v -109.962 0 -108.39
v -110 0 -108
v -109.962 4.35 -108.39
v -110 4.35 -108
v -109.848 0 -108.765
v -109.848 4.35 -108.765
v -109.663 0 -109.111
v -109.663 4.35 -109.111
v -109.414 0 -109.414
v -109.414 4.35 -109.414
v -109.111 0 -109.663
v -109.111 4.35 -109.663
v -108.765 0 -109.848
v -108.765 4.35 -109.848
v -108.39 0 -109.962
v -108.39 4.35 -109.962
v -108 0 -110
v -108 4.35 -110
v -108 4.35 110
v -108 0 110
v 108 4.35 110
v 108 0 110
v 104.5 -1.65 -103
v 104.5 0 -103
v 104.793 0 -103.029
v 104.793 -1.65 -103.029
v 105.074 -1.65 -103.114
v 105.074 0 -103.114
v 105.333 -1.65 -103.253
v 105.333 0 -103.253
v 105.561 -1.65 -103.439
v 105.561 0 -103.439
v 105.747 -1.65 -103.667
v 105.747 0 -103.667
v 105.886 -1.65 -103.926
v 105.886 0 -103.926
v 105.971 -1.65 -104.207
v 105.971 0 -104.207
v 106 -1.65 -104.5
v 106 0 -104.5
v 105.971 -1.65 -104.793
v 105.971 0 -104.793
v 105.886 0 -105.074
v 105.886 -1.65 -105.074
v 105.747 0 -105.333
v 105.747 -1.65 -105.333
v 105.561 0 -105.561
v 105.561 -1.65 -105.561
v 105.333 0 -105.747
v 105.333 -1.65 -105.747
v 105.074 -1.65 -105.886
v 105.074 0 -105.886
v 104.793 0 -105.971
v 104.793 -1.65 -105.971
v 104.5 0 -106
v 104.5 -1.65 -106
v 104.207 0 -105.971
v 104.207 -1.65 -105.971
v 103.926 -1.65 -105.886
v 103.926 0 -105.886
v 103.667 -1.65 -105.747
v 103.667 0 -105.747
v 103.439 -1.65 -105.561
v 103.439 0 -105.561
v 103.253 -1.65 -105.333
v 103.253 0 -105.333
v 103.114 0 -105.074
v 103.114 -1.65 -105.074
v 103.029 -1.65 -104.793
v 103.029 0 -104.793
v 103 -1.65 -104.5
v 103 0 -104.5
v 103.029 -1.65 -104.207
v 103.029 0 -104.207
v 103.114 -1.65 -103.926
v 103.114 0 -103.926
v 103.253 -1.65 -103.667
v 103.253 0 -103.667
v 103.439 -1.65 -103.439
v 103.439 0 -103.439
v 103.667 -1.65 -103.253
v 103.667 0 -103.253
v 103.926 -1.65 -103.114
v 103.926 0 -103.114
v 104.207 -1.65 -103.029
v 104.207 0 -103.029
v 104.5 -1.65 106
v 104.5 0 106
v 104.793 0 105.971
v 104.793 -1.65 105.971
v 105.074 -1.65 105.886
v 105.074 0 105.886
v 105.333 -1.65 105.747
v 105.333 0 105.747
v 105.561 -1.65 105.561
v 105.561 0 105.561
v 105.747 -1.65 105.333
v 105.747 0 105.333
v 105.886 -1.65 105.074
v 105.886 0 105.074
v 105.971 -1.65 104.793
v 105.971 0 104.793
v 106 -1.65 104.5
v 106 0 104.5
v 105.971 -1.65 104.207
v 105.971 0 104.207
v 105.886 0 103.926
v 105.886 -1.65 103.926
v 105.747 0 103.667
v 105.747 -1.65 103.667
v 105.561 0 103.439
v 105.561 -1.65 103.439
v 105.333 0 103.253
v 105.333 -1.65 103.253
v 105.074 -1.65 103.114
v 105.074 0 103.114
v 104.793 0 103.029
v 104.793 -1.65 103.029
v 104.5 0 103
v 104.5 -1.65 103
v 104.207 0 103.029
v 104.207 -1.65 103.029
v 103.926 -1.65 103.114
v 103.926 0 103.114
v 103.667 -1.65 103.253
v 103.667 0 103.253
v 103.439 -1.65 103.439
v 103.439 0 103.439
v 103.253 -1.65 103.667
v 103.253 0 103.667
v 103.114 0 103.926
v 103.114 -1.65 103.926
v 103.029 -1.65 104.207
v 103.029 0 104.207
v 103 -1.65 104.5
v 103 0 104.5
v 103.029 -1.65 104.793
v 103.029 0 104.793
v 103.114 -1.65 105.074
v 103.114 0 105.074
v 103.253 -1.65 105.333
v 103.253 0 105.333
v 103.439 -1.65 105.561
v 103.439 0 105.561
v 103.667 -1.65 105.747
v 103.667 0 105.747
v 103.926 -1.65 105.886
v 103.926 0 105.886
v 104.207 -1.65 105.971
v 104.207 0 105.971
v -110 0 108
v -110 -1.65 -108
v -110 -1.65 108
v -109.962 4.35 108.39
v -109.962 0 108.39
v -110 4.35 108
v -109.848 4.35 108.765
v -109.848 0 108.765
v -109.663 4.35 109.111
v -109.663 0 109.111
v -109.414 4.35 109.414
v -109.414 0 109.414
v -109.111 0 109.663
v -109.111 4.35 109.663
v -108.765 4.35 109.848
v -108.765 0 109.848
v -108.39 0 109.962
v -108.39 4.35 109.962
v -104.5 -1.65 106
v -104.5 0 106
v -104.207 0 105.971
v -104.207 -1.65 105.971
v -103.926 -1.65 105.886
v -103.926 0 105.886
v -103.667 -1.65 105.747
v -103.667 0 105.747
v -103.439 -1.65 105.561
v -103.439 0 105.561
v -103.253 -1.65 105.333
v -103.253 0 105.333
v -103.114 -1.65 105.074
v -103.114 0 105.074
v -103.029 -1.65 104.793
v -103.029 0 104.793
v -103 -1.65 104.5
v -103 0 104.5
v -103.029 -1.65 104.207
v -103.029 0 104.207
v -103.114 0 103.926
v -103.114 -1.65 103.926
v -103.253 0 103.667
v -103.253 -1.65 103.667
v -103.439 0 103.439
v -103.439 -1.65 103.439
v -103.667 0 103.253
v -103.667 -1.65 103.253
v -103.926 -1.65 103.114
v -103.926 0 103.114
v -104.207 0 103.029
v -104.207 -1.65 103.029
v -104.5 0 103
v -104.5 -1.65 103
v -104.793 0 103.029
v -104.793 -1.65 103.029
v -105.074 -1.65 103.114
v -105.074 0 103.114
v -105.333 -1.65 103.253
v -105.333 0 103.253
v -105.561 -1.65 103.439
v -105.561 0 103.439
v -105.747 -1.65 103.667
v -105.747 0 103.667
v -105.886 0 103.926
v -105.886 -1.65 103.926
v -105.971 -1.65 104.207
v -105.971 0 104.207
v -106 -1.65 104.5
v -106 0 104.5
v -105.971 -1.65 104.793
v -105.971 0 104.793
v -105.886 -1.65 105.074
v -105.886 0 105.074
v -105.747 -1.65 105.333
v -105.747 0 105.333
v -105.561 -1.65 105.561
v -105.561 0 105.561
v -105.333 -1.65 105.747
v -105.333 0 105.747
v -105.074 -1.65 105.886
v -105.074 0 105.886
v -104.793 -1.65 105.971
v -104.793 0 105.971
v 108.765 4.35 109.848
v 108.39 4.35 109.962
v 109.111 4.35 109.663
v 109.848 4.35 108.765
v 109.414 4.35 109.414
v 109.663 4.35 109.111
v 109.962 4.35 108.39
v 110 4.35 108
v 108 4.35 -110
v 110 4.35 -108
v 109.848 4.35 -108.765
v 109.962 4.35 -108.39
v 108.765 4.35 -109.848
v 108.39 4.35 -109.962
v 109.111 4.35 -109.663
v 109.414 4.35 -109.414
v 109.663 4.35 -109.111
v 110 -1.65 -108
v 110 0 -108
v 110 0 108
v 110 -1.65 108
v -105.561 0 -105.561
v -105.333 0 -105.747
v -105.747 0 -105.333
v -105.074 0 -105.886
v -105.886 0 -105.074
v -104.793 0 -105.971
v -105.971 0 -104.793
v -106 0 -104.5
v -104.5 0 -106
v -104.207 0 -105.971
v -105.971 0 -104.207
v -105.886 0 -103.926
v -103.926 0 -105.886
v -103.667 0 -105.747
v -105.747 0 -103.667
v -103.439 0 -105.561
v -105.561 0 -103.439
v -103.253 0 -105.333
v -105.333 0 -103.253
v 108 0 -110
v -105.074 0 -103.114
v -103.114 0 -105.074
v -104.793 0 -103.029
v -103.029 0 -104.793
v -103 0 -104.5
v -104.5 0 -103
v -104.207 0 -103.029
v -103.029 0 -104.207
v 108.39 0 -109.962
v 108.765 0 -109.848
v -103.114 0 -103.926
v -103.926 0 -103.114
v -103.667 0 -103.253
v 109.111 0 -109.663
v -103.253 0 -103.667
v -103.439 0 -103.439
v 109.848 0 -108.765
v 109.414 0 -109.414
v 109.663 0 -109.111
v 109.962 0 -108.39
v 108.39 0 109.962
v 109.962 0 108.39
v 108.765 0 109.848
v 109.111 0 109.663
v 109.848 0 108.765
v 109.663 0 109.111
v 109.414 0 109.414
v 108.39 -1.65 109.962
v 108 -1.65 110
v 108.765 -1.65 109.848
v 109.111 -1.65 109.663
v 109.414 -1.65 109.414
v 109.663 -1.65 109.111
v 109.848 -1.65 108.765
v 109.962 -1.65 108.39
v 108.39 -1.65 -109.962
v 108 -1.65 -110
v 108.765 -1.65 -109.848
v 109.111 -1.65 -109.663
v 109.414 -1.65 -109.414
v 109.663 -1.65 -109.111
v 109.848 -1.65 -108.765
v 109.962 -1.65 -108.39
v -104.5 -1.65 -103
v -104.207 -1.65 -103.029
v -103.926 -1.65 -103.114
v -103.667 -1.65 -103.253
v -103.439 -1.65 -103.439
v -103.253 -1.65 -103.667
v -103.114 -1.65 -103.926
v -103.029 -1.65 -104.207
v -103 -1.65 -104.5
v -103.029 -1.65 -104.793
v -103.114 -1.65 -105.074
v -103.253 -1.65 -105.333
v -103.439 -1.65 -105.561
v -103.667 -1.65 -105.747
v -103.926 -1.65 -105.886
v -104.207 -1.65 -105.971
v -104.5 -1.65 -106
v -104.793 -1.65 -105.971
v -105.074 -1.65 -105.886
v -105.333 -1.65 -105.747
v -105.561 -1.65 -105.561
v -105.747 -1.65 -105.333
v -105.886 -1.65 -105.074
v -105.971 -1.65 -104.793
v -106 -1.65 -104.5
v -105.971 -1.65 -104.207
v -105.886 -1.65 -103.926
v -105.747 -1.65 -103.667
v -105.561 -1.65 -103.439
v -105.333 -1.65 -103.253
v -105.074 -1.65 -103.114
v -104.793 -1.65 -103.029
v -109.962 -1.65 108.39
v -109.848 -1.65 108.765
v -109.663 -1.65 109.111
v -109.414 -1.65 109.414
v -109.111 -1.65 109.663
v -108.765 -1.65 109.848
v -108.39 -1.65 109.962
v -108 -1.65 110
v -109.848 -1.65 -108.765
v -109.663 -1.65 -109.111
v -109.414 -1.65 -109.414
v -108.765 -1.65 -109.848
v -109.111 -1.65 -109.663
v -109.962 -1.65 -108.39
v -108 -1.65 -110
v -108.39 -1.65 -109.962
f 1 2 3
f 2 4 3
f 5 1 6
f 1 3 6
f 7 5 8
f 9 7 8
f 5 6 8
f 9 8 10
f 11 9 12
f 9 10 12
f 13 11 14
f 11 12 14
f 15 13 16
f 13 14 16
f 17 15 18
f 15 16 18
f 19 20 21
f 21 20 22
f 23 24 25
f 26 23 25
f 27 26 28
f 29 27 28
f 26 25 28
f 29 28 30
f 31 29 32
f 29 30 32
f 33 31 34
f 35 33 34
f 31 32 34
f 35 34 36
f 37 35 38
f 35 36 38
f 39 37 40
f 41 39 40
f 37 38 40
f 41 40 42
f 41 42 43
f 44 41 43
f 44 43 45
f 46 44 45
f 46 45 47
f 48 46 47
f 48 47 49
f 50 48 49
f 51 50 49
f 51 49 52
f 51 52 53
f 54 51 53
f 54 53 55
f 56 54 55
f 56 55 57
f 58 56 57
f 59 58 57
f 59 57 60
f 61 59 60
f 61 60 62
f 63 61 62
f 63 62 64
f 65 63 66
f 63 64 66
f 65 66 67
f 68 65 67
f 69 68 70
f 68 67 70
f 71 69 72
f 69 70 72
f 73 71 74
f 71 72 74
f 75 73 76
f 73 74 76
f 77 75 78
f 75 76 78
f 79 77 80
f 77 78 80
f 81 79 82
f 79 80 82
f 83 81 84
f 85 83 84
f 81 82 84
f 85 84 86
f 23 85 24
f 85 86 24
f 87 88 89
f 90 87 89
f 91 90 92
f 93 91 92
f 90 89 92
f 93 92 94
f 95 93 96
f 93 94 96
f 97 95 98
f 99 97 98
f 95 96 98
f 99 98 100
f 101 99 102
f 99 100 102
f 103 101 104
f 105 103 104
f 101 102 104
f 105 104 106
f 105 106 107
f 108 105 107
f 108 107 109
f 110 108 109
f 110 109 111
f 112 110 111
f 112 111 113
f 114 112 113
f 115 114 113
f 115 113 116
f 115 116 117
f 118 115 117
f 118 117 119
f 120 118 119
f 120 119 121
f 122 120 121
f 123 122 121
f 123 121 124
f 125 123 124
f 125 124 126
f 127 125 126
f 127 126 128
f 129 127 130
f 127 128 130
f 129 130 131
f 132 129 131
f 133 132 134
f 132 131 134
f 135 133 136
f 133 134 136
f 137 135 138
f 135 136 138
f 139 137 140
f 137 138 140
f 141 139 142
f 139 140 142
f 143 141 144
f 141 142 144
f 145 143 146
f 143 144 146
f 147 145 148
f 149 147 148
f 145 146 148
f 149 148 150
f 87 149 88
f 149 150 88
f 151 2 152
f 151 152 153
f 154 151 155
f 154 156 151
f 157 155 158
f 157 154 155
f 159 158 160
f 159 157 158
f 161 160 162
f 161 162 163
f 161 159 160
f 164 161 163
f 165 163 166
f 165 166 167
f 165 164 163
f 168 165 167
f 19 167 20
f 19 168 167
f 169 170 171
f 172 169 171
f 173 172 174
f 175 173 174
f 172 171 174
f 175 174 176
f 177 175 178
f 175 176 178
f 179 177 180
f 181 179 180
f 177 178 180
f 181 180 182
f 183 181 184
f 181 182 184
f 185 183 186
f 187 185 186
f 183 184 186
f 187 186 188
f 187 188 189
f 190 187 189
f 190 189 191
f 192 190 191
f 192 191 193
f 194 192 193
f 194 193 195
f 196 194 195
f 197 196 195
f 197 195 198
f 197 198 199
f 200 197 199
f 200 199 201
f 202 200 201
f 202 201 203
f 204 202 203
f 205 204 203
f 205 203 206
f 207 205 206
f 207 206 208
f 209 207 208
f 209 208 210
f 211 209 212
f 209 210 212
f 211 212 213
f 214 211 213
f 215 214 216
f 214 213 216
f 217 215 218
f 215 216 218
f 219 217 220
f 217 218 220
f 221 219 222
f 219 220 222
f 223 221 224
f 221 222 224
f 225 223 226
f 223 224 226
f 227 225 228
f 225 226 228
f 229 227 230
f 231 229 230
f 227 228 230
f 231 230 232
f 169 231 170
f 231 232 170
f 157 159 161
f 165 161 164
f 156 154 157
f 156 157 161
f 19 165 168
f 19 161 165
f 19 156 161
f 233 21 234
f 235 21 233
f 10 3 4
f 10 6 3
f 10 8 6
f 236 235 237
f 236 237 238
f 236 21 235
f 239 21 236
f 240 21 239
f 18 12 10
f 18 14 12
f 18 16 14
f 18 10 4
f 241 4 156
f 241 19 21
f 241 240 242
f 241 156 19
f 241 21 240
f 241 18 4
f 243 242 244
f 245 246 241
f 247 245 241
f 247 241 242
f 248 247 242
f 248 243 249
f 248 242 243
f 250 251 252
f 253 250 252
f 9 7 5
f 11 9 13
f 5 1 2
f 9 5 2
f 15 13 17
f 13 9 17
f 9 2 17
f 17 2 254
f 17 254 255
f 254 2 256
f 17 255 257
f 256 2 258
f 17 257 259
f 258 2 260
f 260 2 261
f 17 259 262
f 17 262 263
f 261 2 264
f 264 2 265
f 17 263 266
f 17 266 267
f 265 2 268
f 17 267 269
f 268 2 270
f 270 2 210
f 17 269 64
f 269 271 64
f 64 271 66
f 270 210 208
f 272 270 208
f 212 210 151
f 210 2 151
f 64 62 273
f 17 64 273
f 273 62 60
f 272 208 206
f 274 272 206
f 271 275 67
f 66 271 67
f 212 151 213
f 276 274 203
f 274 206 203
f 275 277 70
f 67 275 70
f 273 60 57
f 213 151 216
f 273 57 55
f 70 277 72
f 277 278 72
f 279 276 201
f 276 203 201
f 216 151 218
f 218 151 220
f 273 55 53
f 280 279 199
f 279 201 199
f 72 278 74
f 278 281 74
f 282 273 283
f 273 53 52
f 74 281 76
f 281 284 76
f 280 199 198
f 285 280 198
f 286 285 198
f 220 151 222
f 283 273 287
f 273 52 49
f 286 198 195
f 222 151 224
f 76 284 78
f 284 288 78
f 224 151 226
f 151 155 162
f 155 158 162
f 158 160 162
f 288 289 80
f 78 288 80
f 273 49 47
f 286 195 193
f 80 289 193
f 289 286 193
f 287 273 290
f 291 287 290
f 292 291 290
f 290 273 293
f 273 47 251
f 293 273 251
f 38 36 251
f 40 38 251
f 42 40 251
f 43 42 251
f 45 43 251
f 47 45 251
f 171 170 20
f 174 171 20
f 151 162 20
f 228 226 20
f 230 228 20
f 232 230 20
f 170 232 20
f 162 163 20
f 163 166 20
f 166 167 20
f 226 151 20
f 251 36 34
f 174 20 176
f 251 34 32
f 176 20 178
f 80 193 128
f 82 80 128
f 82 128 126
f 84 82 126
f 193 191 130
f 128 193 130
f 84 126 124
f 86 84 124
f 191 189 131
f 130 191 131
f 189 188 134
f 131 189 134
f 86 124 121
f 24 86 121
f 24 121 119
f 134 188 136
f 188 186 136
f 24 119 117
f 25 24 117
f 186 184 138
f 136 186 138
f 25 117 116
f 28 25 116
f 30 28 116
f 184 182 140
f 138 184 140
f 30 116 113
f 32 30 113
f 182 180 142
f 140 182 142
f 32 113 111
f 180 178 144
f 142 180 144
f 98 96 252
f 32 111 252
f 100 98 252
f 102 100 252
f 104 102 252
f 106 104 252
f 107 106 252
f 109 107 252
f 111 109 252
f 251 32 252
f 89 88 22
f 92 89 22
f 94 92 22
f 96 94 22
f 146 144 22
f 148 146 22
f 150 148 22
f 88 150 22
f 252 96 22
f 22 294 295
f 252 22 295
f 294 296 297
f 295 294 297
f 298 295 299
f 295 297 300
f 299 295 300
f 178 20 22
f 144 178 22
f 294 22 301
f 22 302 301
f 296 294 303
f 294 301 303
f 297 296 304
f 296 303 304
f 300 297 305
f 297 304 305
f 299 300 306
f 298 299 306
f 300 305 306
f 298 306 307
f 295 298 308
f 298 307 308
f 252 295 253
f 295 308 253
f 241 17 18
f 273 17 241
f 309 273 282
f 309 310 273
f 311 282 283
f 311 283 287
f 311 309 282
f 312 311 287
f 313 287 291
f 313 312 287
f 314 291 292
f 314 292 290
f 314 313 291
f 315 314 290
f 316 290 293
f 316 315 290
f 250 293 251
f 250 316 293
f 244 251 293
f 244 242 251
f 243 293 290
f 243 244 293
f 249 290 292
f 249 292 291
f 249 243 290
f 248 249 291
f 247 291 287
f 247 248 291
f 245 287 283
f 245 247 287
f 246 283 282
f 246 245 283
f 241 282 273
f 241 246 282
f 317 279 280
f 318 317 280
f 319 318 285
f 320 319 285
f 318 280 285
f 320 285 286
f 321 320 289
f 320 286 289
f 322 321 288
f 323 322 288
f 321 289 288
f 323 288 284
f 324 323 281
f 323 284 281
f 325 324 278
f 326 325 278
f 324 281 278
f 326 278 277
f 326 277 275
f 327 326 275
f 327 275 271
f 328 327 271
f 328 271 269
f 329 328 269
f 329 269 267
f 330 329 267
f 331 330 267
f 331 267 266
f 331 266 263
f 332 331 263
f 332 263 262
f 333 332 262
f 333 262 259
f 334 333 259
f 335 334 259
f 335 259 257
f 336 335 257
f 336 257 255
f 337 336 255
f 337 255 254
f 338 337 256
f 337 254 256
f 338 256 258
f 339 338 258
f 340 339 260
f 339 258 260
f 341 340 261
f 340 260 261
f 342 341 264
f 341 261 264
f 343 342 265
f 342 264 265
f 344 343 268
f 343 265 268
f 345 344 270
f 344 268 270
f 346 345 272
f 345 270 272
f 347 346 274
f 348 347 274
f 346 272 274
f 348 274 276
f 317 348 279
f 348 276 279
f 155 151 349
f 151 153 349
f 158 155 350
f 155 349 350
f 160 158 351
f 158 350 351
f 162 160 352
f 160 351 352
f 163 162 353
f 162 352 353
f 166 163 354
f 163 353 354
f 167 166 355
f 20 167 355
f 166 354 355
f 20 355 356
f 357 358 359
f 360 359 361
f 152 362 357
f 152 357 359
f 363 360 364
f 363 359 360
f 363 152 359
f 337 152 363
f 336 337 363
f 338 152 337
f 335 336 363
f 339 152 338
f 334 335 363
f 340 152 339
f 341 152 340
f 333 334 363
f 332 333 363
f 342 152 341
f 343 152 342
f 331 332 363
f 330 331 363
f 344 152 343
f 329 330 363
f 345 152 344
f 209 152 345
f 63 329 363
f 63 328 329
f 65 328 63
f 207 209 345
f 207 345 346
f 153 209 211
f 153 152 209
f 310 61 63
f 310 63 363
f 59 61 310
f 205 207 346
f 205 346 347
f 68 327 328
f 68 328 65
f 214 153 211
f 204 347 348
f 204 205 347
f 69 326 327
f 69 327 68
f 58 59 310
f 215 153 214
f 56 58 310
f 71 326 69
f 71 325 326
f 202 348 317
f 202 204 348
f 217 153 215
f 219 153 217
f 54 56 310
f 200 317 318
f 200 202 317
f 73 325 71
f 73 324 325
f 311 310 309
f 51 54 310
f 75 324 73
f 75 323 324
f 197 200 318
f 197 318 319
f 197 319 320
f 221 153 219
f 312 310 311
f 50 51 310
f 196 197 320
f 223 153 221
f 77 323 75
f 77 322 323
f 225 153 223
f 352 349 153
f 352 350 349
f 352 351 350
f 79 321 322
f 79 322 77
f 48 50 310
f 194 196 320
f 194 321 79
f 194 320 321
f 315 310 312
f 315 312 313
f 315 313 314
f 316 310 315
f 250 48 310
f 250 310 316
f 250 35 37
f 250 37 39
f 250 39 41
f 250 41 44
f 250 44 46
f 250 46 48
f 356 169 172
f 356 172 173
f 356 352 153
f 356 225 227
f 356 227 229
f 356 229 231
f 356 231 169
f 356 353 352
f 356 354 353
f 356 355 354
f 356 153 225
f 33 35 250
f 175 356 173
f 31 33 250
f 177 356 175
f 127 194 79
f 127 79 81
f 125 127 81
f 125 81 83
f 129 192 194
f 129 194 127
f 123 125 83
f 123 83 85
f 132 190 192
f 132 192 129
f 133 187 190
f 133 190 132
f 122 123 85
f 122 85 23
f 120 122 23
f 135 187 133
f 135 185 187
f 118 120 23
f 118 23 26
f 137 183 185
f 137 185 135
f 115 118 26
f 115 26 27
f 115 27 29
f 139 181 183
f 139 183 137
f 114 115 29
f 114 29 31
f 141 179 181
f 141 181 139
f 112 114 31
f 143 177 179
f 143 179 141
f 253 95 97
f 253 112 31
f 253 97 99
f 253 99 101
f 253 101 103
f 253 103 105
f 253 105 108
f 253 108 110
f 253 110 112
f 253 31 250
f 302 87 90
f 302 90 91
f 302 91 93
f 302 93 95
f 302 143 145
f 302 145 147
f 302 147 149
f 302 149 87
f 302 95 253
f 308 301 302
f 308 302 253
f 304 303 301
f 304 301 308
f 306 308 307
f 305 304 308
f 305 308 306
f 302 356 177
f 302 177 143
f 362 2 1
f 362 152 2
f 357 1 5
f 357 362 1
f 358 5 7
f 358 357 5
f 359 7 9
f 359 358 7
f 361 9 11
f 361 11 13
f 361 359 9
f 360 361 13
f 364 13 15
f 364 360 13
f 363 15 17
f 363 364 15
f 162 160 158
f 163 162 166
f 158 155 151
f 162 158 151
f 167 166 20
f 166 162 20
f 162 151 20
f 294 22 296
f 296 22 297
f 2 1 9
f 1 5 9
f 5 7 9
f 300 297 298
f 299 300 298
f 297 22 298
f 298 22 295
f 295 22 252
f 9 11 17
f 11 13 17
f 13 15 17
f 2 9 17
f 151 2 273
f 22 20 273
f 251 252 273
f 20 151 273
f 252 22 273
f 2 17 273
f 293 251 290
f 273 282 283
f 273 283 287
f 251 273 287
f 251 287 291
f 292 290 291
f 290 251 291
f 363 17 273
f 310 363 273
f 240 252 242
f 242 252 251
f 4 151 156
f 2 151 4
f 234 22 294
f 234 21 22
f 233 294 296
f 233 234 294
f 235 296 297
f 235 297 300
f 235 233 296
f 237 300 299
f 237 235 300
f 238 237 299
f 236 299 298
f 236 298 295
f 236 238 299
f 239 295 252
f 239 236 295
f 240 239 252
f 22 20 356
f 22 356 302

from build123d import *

# Parameters (mm, degrees)
SKETCH1_W           = 220
SKETCH1_H           = 220
BOSS_EXTRUDE1_DEPTH = 4.35
SKETCH2_W           = 220
SKETCH2_H           = 220
BOSS_EXTRUDE2_DEPTH = 1.65
SKETCH4_R           = 1.5
CUT_EXTRUDE1_DEPTH  = 156.624299195
FILLET1_R           = 2
FILLET2_R           = 2


with BuildPart() as part:
    # Sketch1 → Boss-Extrude1 (new body)
    with BuildSketch(Plane(origin=(0, 0, 0), x_dir=(1, 0, 0), z_dir=(0, 1, 0))):
        Rectangle(SKETCH1_W, SKETCH1_H)
    extrude(amount=BOSS_EXTRUDE1_DEPTH)

    # Fillet1
    fillet1_edges = [part.edges().sort_by_distance(p)[0] for p in [
        (110, 2.175, 110),
        (-110, 2.175, 110),
        (-110, 2.175, -110),
        (110, 2.175, -110),
    ]]
    fillet(fillet1_edges, radius=FILLET1_R)


with BuildPart() as body_2:
    # Sketch2 → Boss-Extrude2 (new body)
    with BuildSketch(Plane.XZ):
        Rectangle(SKETCH2_W, SKETCH2_H)
    extrude(amount=BOSS_EXTRUDE2_DEPTH)

    # Sketch4 → Cut-Extrude1 (cut, through all)
    with BuildSketch(Plane(origin=(0, 0, 0), x_dir=(1, 0, 0), z_dir=(0, 1, 0))):
        with Locations(Location((-104.5, 104.5, 0), (0, 0, 270))):
            Circle(SKETCH4_R)
        with Locations(Location((104.5, 104.5, 0), (0, 0, 270))):
            Circle(SKETCH4_R)
        with Locations(Location((104.5, -104.5, 0), (0, 0, 270))):
            Circle(SKETCH4_R)
        with Locations(Location((-104.5, -104.5, 0), (0, 0, 270))):
            Circle(SKETCH4_R)
    extrude(amount=-CUT_EXTRUDE1_DEPTH, mode=Mode.SUBTRACT)

    # Fillet2
    fillet2_edges = [body_2.edges().sort_by_distance(p)[0] for p in [
        (-110, -0.825, -110),
        (-110, -0.825, 110),
        (110, -0.825, 110),
        (110, -0.825, -110),
    ]]
    fillet(fillet2_edges, radius=FILLET2_R)


solid = Compound([part.part, body_2.part])
